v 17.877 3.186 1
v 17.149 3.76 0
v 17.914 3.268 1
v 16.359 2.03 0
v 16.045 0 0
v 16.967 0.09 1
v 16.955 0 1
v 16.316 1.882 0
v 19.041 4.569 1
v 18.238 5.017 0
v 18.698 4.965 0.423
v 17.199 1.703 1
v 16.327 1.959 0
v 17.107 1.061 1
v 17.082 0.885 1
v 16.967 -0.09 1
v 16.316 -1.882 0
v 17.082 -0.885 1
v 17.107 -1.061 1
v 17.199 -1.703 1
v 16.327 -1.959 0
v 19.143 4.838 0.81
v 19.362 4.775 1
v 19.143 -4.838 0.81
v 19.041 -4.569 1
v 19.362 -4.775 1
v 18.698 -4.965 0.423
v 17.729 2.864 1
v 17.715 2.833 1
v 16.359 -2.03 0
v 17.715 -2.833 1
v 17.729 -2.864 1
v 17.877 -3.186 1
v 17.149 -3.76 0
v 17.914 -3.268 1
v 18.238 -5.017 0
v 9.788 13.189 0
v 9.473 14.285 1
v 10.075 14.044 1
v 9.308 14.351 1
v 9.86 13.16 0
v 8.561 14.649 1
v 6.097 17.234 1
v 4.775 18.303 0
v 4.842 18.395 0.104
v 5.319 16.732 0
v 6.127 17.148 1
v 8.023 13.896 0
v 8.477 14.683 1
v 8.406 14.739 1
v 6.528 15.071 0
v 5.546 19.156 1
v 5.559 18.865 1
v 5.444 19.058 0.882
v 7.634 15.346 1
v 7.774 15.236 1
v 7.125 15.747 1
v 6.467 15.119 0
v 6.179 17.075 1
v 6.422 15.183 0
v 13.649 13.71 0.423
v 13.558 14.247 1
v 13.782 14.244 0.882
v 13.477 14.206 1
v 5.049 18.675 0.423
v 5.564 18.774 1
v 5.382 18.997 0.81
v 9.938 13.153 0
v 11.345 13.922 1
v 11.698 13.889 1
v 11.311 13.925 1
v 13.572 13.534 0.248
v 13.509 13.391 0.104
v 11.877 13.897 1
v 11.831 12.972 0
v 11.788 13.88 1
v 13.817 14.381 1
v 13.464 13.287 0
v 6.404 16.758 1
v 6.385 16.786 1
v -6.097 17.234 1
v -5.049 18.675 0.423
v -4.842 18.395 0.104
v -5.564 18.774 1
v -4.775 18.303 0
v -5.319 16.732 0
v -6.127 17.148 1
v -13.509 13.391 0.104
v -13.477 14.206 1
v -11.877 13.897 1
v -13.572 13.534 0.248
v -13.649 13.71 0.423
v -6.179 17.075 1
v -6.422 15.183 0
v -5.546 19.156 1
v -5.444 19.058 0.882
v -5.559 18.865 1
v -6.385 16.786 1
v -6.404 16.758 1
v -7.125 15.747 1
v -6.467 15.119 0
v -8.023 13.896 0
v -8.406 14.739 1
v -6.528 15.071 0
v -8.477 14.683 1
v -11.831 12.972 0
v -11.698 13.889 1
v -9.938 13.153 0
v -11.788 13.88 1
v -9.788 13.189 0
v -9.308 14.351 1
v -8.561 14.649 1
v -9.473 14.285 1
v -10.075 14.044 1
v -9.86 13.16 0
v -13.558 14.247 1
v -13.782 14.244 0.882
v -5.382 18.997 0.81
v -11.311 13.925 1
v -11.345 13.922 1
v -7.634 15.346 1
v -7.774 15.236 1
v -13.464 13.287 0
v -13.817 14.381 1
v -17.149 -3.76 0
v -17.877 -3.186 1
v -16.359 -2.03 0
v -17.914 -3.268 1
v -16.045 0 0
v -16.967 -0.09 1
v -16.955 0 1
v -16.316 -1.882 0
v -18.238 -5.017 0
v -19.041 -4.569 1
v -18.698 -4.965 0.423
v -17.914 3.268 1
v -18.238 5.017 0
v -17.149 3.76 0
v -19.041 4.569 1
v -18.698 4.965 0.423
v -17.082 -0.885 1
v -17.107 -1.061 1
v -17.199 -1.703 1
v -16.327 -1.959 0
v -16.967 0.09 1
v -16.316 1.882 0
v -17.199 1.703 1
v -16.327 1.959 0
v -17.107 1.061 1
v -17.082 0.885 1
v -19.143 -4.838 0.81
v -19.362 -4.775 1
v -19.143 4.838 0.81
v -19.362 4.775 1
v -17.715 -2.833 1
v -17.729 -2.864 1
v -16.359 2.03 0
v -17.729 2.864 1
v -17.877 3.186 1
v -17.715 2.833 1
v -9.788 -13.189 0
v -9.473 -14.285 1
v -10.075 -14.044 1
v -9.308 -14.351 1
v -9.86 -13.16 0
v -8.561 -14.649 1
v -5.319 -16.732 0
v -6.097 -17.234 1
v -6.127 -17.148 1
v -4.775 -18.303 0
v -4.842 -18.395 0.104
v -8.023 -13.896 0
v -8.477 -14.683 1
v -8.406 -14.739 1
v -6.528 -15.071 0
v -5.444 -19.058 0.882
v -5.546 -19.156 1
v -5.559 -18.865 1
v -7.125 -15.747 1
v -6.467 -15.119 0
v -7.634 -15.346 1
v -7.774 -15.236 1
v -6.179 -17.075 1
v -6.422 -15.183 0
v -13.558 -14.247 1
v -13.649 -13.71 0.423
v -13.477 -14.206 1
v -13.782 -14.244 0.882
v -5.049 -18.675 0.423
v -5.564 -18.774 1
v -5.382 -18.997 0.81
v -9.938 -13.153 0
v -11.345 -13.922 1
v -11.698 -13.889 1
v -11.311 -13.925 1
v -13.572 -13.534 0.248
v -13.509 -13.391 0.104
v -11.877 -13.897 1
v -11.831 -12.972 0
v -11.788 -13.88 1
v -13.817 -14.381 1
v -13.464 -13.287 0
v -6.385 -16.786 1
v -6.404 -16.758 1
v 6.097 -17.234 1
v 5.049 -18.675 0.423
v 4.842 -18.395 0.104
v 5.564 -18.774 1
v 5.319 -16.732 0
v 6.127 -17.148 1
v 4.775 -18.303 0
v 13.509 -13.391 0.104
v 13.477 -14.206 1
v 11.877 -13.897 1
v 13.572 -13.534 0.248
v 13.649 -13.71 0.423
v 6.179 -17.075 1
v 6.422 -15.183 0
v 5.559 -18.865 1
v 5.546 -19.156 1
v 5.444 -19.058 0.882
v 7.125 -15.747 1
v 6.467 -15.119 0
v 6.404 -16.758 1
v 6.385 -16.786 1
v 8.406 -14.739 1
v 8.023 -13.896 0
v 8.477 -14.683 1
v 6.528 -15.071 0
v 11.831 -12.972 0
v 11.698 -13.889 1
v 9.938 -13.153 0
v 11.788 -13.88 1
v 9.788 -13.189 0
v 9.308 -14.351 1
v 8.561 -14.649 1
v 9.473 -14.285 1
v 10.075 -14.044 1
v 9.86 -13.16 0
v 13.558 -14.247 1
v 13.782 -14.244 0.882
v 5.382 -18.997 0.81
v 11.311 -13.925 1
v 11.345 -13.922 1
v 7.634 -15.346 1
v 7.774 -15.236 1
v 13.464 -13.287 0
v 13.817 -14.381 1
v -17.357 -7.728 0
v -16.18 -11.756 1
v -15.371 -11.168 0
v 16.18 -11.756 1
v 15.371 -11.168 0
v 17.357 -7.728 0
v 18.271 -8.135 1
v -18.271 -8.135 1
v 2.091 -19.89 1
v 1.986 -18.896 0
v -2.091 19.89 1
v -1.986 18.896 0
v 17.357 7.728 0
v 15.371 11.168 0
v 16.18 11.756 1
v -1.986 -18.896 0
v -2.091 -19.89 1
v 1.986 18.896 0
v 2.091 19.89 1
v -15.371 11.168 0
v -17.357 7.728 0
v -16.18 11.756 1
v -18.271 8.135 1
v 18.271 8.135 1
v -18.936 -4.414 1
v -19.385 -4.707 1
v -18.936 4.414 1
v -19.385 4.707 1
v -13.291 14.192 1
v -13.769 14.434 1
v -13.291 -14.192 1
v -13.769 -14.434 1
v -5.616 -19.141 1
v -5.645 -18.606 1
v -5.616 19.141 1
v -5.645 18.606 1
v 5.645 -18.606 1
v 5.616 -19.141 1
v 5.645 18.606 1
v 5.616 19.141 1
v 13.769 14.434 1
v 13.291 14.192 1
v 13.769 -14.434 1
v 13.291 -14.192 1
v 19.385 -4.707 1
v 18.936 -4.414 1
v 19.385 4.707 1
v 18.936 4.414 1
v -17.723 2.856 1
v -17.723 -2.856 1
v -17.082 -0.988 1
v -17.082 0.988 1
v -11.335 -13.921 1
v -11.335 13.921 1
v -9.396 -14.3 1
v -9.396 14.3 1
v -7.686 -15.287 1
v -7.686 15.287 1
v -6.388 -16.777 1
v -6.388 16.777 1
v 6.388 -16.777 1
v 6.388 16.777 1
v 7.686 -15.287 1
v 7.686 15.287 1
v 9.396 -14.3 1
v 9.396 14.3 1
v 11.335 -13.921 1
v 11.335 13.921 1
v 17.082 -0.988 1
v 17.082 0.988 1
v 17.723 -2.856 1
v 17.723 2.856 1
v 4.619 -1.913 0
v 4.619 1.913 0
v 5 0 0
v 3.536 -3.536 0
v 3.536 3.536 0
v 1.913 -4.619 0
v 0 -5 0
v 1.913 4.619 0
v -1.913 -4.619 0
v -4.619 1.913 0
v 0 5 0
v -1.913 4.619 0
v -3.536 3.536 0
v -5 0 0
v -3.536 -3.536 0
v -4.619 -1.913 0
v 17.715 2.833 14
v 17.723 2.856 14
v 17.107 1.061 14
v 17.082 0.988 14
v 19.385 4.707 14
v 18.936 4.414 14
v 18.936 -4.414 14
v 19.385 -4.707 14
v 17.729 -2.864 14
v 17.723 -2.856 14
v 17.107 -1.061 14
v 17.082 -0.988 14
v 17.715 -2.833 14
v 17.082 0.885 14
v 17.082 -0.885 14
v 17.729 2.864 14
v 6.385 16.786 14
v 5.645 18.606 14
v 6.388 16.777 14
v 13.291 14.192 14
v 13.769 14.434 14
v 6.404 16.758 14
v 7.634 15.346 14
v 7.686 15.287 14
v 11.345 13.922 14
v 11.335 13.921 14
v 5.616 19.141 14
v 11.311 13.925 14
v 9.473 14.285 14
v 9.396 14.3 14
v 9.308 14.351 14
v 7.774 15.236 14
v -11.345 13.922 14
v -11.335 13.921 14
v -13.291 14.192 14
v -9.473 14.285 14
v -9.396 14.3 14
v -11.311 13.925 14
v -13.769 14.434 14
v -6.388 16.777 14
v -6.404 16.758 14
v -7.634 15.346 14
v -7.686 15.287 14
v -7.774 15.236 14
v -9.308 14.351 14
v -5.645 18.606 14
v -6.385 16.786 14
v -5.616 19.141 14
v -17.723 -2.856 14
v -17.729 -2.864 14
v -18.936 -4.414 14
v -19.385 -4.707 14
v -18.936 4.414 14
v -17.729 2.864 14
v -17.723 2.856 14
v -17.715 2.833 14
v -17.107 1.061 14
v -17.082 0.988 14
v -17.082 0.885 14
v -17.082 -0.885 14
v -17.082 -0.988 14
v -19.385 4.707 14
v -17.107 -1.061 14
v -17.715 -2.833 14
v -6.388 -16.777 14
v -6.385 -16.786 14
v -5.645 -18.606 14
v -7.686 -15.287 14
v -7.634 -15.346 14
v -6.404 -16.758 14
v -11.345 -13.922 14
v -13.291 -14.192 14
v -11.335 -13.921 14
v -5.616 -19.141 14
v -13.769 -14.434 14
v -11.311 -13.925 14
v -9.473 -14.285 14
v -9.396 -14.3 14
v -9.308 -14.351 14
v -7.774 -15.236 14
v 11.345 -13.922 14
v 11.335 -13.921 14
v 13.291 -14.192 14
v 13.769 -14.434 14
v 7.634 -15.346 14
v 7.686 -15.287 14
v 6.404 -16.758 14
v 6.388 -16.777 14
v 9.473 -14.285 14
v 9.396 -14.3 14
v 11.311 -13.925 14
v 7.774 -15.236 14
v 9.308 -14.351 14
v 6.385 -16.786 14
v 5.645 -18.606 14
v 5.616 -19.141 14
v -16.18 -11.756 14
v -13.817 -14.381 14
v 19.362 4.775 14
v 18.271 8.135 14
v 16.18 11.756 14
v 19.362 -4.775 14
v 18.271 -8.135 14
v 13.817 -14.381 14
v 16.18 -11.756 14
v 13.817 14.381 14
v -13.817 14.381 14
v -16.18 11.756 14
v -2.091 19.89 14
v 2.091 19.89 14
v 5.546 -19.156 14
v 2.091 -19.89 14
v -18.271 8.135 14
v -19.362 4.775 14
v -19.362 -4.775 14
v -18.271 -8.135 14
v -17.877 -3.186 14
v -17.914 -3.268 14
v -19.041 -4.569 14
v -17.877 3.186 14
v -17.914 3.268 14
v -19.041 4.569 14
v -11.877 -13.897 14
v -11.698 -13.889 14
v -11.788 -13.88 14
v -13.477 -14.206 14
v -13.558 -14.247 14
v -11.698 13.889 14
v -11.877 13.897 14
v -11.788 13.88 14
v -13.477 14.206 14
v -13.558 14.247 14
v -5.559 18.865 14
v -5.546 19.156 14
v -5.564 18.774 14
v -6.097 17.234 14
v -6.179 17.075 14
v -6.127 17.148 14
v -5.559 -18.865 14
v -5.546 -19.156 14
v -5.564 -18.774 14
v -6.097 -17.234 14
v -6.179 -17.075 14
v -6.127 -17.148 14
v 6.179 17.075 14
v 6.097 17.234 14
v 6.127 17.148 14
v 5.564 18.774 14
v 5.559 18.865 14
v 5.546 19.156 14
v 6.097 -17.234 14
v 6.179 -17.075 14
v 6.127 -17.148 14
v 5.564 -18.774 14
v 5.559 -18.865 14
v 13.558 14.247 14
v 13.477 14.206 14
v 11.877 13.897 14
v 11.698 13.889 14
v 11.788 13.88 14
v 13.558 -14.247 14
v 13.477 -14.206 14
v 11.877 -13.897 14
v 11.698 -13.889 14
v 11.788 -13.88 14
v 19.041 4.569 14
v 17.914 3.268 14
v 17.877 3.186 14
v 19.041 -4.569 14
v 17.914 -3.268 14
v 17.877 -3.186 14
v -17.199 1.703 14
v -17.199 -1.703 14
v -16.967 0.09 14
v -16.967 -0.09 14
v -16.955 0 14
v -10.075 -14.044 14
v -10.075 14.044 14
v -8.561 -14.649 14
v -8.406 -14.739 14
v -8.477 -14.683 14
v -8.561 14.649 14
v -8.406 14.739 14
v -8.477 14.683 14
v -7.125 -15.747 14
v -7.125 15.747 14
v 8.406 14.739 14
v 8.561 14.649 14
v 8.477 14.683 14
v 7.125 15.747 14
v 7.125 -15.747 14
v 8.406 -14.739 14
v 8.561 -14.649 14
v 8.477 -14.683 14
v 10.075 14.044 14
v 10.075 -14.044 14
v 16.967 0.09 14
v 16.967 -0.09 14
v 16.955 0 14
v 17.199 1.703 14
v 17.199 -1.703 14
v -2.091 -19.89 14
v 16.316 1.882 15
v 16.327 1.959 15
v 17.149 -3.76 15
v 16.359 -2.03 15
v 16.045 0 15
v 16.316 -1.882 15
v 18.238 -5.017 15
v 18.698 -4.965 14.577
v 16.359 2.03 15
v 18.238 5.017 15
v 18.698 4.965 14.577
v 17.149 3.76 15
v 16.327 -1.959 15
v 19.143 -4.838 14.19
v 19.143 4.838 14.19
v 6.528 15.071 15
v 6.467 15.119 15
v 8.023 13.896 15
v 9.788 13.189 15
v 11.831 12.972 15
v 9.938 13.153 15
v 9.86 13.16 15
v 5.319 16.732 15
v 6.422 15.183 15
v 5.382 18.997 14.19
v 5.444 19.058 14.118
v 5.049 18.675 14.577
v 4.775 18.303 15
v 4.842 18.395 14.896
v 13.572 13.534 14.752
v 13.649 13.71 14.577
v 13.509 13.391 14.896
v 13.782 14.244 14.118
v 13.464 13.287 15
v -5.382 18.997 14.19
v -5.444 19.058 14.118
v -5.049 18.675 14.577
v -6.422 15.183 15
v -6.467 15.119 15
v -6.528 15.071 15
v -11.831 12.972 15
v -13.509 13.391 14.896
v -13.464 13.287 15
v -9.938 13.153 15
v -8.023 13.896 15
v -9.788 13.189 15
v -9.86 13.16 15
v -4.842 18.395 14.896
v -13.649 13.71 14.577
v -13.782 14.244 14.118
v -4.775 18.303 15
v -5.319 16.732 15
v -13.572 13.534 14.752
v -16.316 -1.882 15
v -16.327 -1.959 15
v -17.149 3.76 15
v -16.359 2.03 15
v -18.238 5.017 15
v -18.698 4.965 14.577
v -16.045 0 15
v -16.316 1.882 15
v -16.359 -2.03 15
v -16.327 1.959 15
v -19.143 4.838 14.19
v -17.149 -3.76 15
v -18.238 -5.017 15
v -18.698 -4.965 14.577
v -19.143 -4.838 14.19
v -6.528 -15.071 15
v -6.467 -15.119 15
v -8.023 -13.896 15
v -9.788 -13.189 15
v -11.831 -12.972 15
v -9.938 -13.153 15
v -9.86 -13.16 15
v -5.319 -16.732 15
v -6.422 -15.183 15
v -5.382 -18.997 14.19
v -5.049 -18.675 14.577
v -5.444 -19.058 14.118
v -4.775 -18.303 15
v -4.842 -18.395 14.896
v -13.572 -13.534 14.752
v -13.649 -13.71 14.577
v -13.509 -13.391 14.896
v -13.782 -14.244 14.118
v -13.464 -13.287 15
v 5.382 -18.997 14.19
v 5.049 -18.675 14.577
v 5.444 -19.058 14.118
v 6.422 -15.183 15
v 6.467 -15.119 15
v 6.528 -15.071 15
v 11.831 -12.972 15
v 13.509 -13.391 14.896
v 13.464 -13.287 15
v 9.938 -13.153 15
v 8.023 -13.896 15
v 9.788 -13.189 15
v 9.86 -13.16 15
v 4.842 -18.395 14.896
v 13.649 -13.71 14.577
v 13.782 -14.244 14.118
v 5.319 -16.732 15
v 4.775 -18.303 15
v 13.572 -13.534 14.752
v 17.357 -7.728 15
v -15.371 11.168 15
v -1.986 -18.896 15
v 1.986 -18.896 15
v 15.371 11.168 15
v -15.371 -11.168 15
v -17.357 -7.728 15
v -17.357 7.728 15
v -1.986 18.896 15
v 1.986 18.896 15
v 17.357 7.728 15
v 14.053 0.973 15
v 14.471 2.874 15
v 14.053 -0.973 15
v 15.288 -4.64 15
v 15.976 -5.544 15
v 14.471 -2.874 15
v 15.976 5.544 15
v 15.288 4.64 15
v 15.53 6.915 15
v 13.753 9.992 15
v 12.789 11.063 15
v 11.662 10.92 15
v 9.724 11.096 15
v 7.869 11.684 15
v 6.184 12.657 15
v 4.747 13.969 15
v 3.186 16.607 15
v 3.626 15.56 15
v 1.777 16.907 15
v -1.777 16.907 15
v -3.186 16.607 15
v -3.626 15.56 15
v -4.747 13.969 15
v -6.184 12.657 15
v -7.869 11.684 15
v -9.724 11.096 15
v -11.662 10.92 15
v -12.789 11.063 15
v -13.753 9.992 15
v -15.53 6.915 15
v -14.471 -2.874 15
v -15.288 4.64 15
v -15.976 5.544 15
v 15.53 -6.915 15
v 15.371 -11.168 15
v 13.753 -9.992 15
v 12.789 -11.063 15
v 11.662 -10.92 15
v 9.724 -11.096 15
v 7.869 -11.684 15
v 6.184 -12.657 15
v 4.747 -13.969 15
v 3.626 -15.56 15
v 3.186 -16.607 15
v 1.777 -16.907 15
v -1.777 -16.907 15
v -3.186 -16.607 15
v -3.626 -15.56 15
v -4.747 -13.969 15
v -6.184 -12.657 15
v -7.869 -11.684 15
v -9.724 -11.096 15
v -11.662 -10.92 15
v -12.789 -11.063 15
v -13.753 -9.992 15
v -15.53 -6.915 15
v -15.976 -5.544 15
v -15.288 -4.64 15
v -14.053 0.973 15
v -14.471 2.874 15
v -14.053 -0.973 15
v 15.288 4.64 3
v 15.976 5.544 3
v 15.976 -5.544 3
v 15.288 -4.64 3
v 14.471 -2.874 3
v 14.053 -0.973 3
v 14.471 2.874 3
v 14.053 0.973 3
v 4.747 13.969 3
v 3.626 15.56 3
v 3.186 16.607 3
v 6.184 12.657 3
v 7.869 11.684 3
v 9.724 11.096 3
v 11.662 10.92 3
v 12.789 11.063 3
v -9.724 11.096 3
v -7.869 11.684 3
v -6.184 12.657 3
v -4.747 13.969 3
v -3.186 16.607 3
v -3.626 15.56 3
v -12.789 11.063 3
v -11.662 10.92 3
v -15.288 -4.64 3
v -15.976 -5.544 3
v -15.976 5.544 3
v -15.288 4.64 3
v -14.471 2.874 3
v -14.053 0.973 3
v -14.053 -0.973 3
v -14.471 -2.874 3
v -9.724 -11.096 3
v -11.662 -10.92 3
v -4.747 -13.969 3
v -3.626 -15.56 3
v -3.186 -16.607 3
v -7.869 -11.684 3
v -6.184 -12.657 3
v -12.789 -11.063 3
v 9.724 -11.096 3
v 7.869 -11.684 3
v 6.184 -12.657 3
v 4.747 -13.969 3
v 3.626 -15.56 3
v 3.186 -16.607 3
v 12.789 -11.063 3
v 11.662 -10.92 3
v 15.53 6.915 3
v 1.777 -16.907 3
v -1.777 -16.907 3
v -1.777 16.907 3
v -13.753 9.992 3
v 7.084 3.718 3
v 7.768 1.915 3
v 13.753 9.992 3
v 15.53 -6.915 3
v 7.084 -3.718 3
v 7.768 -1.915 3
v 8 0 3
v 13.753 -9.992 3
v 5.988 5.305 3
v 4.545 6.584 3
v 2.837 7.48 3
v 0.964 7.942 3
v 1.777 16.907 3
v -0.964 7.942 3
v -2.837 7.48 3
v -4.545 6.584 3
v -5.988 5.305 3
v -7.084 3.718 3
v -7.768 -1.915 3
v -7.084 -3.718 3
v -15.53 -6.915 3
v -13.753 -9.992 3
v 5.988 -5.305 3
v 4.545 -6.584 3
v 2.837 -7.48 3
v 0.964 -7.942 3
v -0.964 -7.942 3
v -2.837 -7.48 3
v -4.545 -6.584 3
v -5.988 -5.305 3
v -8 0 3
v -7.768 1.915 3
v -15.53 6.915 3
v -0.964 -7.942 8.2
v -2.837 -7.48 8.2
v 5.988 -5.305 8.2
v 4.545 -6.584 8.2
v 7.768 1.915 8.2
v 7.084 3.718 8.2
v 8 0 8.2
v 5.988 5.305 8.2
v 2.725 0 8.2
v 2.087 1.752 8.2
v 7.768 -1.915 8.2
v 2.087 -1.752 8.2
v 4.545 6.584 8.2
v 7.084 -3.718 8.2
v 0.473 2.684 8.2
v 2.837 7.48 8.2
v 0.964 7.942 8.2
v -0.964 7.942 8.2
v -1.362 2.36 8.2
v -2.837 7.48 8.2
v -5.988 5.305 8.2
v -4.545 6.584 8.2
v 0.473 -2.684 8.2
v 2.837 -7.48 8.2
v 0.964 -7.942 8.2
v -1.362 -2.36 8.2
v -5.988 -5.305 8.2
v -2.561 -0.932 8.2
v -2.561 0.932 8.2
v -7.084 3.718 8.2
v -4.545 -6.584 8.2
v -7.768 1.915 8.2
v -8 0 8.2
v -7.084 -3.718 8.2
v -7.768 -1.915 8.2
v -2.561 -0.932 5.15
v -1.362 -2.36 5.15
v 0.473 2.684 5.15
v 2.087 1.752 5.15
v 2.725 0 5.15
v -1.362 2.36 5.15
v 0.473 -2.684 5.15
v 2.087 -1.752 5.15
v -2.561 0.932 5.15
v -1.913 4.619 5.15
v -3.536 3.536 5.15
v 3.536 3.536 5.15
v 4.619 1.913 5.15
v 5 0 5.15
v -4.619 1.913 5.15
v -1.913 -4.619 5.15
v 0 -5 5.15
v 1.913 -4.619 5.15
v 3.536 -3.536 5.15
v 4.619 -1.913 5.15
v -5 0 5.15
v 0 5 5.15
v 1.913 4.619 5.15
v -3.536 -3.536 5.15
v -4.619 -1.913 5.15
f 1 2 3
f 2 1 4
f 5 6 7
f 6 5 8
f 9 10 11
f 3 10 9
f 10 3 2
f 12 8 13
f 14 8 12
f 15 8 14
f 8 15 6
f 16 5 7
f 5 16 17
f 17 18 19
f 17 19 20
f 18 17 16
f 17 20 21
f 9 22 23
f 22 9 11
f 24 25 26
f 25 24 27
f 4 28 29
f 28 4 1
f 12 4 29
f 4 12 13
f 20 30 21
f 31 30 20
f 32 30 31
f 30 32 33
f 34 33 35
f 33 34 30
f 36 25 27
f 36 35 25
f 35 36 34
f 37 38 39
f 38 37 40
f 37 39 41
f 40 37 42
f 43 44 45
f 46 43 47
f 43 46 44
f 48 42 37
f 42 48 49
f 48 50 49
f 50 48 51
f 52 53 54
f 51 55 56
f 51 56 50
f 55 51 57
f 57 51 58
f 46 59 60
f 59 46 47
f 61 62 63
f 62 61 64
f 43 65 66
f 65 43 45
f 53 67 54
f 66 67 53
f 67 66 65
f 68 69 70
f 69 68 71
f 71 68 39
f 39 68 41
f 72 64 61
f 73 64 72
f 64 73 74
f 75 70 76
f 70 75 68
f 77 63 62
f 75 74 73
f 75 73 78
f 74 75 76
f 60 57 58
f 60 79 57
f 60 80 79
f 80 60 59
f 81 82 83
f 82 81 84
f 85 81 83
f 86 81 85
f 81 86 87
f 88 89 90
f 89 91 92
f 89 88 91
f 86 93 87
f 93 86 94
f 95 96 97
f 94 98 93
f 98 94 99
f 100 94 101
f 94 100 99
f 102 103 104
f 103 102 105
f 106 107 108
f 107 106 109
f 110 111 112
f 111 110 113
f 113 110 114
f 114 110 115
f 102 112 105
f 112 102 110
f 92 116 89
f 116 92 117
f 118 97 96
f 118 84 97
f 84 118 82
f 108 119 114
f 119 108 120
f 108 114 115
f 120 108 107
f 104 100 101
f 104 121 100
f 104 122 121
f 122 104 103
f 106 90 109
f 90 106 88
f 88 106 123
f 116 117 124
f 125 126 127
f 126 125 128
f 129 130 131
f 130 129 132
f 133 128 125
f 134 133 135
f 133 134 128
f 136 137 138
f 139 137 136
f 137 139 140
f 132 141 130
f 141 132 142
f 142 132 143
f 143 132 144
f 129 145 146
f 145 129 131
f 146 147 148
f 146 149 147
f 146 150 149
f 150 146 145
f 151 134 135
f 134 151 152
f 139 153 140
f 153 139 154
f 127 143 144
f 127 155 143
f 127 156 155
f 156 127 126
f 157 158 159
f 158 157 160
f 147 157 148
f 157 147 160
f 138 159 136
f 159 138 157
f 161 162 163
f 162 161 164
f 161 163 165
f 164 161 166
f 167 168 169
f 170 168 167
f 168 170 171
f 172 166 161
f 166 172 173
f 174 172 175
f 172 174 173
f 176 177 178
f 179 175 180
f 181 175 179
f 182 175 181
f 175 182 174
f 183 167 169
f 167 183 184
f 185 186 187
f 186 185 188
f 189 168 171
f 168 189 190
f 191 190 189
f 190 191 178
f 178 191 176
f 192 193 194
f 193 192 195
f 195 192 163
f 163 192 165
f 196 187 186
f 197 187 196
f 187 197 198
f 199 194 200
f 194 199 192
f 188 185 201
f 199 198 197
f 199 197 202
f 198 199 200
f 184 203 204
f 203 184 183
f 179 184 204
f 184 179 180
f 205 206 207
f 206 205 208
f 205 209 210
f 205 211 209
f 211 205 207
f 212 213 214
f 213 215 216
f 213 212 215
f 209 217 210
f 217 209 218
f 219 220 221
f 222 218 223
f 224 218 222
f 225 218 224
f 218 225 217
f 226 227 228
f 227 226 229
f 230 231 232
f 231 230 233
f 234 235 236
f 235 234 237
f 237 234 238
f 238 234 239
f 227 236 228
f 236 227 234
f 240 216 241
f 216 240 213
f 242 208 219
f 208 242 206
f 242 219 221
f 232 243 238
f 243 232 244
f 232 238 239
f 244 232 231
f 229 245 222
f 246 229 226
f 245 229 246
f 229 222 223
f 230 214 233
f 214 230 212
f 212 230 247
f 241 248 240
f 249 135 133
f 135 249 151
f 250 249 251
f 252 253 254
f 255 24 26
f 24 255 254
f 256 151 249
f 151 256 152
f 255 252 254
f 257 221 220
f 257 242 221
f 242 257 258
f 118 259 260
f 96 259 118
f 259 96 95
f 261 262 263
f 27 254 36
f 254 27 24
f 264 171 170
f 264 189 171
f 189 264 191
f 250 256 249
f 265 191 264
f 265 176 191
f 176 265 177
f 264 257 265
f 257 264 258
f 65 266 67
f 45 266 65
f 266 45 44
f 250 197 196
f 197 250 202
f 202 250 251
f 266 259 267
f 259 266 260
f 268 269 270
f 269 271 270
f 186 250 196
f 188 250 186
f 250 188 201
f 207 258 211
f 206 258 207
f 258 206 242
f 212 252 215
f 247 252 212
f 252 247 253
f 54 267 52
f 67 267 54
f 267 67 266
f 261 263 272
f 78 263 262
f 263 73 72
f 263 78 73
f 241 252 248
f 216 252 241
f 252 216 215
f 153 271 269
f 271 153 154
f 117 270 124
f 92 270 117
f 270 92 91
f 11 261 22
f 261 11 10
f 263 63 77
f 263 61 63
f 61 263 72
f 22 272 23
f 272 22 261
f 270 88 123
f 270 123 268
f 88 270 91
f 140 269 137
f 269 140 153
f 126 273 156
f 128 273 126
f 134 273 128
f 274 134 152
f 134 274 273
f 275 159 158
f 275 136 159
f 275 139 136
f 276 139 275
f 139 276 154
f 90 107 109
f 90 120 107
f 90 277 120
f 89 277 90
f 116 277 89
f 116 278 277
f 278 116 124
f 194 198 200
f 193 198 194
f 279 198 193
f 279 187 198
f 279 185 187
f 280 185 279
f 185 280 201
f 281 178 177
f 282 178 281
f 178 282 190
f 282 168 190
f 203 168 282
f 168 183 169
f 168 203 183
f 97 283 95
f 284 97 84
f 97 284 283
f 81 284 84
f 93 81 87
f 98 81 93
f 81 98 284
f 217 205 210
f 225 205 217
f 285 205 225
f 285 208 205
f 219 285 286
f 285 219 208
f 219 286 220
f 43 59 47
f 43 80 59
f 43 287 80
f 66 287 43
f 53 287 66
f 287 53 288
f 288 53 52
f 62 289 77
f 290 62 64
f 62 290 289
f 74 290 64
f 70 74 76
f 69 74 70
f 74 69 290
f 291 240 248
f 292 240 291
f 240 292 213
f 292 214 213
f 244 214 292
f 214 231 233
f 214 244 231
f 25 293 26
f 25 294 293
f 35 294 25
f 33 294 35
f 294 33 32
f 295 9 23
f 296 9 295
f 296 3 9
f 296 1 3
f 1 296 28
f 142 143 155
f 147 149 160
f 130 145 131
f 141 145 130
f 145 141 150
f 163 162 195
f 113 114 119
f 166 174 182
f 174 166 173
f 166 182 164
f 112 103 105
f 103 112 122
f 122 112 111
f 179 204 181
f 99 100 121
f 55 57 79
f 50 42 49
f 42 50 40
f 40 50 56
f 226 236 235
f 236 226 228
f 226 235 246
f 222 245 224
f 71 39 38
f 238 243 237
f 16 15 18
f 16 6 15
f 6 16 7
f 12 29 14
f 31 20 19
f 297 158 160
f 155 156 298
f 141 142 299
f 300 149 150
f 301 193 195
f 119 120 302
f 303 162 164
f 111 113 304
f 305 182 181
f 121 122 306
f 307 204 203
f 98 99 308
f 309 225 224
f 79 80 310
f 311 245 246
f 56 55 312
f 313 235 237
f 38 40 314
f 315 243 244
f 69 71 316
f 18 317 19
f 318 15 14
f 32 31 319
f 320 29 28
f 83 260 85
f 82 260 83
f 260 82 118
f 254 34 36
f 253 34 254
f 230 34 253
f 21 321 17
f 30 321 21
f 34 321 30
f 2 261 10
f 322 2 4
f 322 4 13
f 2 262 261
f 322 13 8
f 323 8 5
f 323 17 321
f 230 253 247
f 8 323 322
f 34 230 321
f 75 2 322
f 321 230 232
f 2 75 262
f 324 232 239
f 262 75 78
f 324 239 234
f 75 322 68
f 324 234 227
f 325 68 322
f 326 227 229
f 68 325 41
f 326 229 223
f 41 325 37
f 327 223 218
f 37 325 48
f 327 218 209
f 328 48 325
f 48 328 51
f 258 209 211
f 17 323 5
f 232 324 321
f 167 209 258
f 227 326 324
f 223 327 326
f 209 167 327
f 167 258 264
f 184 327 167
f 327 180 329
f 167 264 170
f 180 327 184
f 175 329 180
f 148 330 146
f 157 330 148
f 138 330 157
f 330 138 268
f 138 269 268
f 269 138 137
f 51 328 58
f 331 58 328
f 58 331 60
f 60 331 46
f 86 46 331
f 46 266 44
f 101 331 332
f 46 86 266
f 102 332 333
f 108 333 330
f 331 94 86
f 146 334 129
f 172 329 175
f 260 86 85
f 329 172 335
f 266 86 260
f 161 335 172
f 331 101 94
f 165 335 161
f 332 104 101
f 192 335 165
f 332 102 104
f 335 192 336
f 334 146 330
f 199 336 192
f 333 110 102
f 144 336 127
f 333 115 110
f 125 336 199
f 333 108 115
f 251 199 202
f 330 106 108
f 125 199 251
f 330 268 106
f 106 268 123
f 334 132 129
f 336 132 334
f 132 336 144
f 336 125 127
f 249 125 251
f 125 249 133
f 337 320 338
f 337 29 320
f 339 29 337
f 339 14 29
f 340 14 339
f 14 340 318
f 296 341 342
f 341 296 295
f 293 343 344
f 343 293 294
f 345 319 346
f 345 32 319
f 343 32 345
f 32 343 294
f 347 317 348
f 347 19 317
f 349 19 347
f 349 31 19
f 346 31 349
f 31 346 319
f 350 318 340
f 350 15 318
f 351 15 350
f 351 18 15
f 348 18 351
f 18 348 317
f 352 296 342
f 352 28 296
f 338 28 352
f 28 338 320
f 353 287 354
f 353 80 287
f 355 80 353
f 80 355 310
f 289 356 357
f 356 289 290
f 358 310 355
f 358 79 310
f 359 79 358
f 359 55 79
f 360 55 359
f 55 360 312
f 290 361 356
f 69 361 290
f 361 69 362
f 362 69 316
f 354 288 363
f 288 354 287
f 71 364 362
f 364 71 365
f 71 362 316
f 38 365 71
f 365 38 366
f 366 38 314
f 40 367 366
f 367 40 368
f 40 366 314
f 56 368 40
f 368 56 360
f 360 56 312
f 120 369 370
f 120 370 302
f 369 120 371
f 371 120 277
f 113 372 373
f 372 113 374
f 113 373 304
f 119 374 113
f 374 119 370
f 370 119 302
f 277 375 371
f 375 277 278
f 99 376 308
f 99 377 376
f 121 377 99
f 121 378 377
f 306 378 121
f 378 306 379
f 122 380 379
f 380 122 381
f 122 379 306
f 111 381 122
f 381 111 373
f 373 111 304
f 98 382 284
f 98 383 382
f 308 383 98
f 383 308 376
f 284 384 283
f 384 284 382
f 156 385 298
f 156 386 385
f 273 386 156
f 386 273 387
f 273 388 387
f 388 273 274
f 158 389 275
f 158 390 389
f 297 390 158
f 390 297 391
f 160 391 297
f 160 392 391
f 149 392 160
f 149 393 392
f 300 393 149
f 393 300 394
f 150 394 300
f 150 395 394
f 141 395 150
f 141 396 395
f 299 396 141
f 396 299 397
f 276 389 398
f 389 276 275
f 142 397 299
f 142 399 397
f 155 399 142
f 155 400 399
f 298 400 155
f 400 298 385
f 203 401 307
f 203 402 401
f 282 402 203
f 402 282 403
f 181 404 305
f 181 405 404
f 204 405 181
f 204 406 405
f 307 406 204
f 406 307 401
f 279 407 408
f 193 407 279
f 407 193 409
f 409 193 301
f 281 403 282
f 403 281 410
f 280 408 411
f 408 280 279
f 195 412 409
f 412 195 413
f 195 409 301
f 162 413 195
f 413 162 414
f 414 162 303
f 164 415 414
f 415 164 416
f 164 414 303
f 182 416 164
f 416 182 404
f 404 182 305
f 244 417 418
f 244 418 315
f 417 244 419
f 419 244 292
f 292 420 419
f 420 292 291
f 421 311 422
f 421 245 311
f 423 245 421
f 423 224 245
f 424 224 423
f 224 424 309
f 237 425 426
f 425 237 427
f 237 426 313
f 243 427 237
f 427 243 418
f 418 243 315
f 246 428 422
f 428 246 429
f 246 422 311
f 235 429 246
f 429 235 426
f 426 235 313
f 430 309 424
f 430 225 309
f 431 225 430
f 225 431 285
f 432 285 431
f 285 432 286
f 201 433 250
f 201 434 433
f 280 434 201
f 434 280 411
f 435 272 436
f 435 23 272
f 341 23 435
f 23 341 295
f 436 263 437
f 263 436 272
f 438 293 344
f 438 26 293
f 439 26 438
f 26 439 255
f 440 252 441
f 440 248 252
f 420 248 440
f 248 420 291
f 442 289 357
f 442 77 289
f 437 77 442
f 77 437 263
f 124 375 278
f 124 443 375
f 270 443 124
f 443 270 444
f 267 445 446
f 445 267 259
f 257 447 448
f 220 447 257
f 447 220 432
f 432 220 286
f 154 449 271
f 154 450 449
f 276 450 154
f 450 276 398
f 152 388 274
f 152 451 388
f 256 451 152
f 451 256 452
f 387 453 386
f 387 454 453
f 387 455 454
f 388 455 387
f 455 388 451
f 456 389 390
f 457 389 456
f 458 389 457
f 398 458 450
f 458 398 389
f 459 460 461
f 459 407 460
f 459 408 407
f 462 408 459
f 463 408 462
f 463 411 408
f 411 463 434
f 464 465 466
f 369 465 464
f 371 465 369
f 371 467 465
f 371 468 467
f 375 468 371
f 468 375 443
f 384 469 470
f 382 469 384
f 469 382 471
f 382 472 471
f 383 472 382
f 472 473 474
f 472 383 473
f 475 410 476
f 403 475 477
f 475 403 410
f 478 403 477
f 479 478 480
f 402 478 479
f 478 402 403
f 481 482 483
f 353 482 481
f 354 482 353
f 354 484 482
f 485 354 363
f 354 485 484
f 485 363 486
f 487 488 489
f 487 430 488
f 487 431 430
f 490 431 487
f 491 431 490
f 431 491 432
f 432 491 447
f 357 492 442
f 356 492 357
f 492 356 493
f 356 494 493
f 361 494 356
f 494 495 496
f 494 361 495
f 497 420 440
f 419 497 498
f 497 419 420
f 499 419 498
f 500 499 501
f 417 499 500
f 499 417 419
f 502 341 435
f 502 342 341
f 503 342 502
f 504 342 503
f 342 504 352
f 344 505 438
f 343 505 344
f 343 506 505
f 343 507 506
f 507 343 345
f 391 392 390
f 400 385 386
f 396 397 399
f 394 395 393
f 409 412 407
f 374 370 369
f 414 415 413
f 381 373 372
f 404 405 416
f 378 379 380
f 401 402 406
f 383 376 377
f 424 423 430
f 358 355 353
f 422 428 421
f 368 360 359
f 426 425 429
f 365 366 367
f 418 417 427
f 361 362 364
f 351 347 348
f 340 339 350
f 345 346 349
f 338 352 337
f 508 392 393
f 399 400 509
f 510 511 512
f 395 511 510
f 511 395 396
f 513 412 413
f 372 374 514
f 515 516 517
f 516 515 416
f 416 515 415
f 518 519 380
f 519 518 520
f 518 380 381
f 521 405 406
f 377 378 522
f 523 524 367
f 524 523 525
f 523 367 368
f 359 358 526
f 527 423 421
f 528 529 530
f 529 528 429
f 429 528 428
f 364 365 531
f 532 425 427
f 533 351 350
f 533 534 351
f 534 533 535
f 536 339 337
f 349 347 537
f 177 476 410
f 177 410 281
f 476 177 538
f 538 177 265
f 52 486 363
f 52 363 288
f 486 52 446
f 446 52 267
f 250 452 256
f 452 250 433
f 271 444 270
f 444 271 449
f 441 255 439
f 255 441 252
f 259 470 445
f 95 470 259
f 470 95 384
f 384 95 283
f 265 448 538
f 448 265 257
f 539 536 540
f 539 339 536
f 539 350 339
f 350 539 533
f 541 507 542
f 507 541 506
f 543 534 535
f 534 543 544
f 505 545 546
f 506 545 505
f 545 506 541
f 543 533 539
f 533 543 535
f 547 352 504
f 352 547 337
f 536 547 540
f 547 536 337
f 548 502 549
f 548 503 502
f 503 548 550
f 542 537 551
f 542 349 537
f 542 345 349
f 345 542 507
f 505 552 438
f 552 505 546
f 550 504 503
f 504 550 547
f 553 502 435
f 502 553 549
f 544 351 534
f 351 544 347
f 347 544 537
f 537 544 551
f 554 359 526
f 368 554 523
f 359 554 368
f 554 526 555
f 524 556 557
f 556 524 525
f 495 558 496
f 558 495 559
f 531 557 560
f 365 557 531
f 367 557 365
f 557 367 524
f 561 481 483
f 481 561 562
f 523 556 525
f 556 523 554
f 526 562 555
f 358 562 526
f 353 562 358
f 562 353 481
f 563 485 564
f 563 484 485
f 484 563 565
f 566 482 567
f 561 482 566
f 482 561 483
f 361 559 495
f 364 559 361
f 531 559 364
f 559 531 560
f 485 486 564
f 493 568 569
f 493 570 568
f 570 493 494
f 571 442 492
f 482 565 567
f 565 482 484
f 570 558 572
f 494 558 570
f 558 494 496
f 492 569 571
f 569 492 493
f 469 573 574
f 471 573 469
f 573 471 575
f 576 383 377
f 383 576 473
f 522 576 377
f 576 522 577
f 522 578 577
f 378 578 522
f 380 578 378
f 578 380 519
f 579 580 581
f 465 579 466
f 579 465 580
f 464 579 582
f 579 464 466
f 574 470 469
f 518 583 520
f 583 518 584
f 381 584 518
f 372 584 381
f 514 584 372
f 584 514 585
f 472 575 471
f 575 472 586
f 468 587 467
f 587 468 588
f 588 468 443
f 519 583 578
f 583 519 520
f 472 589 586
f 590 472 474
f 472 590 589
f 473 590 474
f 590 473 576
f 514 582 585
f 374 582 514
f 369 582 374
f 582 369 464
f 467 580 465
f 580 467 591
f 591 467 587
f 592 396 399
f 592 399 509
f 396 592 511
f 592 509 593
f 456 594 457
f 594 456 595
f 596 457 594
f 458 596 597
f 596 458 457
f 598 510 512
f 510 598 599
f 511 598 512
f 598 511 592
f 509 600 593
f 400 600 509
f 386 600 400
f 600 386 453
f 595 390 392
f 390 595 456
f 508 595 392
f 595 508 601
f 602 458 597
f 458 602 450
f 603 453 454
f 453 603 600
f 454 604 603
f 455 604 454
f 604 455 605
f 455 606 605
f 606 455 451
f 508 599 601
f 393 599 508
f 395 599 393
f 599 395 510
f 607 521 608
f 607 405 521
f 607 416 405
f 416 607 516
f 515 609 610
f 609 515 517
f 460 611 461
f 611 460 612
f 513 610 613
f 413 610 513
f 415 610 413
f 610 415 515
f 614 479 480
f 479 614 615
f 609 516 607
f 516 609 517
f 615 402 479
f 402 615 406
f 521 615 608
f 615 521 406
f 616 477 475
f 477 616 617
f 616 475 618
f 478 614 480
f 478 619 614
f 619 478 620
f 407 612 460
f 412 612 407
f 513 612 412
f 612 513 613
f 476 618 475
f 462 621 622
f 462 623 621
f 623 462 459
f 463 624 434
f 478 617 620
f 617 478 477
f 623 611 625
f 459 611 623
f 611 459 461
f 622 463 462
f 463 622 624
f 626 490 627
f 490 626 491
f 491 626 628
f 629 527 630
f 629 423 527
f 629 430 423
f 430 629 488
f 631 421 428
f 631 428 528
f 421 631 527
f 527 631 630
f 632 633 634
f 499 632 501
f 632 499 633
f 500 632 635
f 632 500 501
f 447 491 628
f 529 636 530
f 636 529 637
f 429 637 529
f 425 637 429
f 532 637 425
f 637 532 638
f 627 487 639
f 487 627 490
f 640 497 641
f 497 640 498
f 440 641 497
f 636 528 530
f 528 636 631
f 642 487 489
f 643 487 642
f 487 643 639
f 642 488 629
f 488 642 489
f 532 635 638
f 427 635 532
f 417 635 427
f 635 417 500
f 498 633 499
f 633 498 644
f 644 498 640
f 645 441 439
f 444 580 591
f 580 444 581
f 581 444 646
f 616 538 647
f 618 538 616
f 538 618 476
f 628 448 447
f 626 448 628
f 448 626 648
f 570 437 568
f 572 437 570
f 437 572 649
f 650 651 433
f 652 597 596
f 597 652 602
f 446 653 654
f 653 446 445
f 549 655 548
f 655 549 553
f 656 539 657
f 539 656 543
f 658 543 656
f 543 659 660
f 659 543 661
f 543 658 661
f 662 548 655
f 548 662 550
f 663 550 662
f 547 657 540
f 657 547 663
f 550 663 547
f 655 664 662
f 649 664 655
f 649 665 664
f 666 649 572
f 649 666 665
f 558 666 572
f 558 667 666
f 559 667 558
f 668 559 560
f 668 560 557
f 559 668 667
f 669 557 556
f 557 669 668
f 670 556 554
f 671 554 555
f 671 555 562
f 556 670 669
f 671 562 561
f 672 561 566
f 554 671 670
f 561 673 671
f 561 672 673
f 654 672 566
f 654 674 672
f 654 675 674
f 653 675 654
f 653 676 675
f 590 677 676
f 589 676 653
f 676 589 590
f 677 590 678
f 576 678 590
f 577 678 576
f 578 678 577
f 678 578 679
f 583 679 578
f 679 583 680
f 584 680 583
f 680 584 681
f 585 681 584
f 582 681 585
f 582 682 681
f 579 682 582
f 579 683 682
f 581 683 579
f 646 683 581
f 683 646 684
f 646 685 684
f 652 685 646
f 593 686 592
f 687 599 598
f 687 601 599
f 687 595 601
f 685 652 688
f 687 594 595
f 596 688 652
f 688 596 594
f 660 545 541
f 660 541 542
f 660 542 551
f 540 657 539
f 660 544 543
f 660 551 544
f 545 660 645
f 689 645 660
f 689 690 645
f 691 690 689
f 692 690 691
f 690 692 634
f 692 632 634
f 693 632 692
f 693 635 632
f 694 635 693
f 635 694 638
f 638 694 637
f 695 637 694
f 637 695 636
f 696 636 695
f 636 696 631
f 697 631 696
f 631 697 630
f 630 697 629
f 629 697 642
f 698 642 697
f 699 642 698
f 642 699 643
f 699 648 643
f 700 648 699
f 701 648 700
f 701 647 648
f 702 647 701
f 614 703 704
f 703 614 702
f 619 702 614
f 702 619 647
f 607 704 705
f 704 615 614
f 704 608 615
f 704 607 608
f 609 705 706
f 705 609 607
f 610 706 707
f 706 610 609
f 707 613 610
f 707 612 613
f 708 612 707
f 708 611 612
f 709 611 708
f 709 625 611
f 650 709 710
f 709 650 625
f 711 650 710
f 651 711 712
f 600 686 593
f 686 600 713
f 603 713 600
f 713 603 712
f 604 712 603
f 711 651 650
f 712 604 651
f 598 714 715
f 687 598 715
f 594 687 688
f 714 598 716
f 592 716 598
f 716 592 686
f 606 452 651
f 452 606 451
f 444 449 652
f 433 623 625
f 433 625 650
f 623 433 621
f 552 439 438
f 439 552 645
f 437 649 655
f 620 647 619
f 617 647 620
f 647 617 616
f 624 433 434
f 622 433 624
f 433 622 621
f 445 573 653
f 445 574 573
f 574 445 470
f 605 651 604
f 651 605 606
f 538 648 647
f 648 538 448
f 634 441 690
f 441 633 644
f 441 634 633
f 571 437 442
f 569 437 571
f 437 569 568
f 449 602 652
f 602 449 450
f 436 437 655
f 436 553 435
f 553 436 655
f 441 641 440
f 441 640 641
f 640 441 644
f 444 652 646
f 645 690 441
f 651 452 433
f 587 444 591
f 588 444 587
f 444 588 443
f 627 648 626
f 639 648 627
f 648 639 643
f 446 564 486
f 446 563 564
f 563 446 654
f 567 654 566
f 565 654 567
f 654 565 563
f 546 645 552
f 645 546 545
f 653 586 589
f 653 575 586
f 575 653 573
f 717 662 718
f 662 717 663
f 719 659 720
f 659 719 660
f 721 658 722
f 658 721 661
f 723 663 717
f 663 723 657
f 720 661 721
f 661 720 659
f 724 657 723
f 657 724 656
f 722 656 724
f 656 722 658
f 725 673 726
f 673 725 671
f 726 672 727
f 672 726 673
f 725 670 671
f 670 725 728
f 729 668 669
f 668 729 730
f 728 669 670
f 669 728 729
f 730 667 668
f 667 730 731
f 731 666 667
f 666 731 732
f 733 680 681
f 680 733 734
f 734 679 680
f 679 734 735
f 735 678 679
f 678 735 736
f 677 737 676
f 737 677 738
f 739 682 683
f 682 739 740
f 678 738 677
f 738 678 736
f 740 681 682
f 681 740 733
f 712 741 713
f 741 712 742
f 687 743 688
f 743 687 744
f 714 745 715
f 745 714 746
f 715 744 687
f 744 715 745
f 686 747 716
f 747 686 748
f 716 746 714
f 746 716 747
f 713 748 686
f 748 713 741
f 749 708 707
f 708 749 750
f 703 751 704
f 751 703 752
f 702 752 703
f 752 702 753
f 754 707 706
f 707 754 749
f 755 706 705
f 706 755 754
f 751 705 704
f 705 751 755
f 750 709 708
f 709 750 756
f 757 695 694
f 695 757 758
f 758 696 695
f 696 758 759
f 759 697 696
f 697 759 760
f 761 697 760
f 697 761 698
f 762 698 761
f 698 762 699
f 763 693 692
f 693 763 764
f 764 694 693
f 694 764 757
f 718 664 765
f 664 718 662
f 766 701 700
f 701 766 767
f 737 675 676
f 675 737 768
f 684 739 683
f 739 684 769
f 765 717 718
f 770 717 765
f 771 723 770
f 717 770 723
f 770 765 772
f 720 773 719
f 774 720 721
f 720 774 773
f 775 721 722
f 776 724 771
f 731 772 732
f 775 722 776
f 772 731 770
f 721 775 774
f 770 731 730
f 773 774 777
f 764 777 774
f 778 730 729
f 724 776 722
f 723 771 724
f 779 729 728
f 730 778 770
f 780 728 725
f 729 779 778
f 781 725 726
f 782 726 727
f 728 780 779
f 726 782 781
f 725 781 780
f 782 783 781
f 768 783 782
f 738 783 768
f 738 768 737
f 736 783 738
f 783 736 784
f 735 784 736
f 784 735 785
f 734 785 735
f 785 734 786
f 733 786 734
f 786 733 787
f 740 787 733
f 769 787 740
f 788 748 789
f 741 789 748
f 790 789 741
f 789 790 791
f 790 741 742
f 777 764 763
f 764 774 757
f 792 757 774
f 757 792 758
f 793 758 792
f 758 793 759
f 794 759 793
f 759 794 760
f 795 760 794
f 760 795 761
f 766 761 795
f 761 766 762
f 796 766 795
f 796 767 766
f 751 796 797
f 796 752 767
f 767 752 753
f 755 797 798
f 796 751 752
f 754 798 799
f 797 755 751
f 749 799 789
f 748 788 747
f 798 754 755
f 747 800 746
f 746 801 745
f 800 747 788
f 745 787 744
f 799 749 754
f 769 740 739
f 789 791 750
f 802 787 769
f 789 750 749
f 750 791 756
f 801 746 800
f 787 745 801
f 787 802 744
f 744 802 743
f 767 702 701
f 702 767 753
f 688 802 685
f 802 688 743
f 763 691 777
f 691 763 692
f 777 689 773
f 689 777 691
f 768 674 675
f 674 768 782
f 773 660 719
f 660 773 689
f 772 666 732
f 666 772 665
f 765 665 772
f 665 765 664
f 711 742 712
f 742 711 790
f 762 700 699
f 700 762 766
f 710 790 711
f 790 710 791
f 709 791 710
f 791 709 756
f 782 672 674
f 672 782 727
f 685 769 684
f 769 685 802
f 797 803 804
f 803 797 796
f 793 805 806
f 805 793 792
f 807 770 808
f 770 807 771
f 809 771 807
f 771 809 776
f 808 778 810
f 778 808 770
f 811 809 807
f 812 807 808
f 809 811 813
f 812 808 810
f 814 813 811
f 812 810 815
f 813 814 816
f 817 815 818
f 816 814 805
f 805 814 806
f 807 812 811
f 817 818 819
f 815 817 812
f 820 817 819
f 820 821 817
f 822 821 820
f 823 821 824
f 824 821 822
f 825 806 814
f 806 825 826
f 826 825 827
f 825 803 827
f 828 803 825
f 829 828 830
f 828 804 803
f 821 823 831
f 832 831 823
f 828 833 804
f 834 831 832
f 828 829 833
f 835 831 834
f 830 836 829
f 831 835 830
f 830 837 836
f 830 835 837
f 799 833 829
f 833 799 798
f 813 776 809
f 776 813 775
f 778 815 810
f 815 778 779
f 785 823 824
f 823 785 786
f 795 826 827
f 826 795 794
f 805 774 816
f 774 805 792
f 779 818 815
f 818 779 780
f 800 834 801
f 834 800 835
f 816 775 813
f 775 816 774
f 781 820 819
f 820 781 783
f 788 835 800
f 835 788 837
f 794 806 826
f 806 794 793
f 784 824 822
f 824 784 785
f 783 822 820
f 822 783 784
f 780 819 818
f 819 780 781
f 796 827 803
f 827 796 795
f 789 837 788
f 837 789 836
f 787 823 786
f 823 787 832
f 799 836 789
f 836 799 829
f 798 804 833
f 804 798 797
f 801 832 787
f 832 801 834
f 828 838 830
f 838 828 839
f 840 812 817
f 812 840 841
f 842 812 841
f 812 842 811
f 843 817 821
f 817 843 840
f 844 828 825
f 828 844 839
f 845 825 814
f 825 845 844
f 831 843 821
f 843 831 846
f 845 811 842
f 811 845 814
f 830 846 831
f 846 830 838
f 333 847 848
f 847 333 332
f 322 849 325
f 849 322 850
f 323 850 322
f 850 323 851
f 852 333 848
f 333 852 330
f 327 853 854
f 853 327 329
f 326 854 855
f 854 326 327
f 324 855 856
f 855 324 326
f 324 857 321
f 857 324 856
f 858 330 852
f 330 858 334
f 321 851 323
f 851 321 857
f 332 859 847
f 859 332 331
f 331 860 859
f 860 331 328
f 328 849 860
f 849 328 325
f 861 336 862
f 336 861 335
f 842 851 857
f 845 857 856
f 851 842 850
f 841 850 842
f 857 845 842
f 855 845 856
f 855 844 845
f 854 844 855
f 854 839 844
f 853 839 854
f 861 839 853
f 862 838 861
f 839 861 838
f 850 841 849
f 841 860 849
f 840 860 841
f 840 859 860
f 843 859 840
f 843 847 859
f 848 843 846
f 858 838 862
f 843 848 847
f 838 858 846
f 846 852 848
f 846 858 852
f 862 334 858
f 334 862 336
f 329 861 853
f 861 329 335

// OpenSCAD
/*
Universal Thumbnut/Socket Knob Design
By: Harrison Fast (2013)

This is a parametric script for a thumb knob which can be used on either a nut, hex head cap screw, or socket head cap screw.
Options include:
unit of measure (metric, imperial)
thread size []
pocket type (Constant_Wall_Thickness, Solid, Circular)
knob diameter
number of rosettes (fingers/cutouts)
size and position of rosette
wall thickness
top wall thickness

Should work in the Thingiverse Customizer

*/

//****Variables - To be Set****\\
//CUSTOMIZER VARIABLES

//What's This Knob For?
Knob_Type=3;//[1:Nut,2:Hex Head Screw,3:Socket Head Screw]

//What Size Nut or Screw? 
Thread_Size=6; //[0:M1.6,1:M2,2:M2.5,3:M3,4:M4,5:M5,6:M6,7:M8,8:M10,9:M12,10:M14,11:M16,12:M20]

//What Kind of Pocket Do You Want?
Knob_Fill=1;//[1:Constant Wall Thickness,2:Solid,3:Circular Cut-Out]

//How Big Should The Knob Be?
Knob_Diameter = 40;
knob_r = Knob_Diameter/2;

//How Thick Should the Grip Be? (Overall Height)
Knob_Thickness=15;
knob_t=Knob_Thickness*1;

//How Thick Should The Walls Be?
Wall_Thickness=3;

//How Many Prongs Should It Have?
Number_of_Rosettes=6; //[1:16]

//How Big Should The Finger Dents Be?
Rosette_Radius=6; 

//How Far Should The Finger Dents be From The Knob Circumference? (This lets you use larger radii by moving the center of the cut-out cylinder away from the center of the knob)
Rosette_Offset = 3;

//How Big Should the Bevel Be?
Chamfer_Size=1;
r_cham = Chamfer_Size*1; //Too lazy to change the proper names to Chamfer_Size

//How Much Clearance Do You Want? 0 probably won't work.
Clearance=.25; //[0:.125:1];

//CUSTOMIZER VARIABLES END


//$fa=6;


echo(knob_t);
knob_hex(); //main function call


//****MODULES***\\

module hex_trude(hex_width,hex_height) //makes a hexagonal prism at hex_width
	{	
		s = hex_width/1.732;
		l_x=s/2;
		l_y=.866*s;
		a_1 = [ [s,0],[l_x,-l_y],[-l_x,-l_y],[-s,0],[-l_x,l_y],[l_x,l_y]];
		b=[0:5];
		linear_extrude (height = hex_height) polygon(a_1,b);
	}


module pocket(hex_width,hex_height)
{	
	if(Knob_Fill==1){
		difference() {
			 translate([0,0,Wall_Thickness]) {cylinder(h=hex_height, r=knob_r-Wall_Thickness);} //wall offset
				for(i=[0:Number_of_Rosettes-1]) {
					rotate([0,0,360*i/Number_of_Rosettes]) 
						translate([knob_r+Rosette_Offset,0,0]) {
							cylinder(h = Wall_Thickness+hex_height, r = Rosette_Radius+Wall_Thickness); } //wall offset rosette
								}
	}//endif
					}

	else if(Knob_Fill==2){
	}//endif

	else if(Knob_Fill==3) {
		translate([0,0,Wall_Thickness]) {
			cylinder(h=hex_height,r=knob_r-Wall_Thickness-Rosette_Radius+Rosette_Offset);
						}
	}//endif
			
} //end module pocket()



module knobby_base_parts(knob_r, knob_h, rA, rB)
{
	difference()
	{
		cylinder(h=knob_h,r1=knob_r-rA,r2=knob_r-rB);
		for(i=[0:Number_of_Rosettes]){
			rotate(360*i/Number_of_Rosettes,[0,0,1]) translate([knob_r+Rosette_Offset,0,-0.05])
				cylinder(h=knob_h+.1,r1=Rosette_Radius+rA,r2=Rosette_Radius+rB);
		} //end if
	} //end difference
} //end knobby_base_parts



module knobby_base(hex_width,hex_height,r_cham)
{
	difference(){
			union() {
				knobby_base_parts(knob_r,r_cham,r_cham,0);
				if(hex_height<Wall_Thickness){
					union() {
						translate([0,0,r_cham]) knobby_base_parts(knob_r,Wall_Thickness-2*r_cham,0,0); 
						translate([0,0,Wall_Thickness]) knobby_base_parts(knob_r, r_cham,0,r_cham);}}

				else {translate([0,0,r_cham]) knobby_base_parts(knob_r,hex_height-2*r_cham,0,0);
					union() {
						translate([0,0,r_cham]) knobby_base_parts(knob_r,hex_height-2*r_cham,0,0); 
						translate([0,0,hex_height-r_cham]) knobby_base_parts(knob_r, r_cham,0,r_cham); }}
				} //end union
			pocket(hex_width,hex_height+1);
					} //end difference
} //end knobby_base


module make_knob(hex_width,hex_height,r_cham)
{
	if(Knob_Type==1){
	difference(){
			union(){
			rotate(0,[0,0,1]) {
			difference(){
				knobby_base(hex_width,knob_t,r_cham);
				translate([0,0,Wall_Thickness])hex_trude(hex_width+.25,hex_height+1+knob_t);
				}}
			translate([0,0,Wall_Thickness]) {
				difference() {
					hex_trude(hex_width+Wall_Thickness*2,hex_height);
					hex_trude(hex_width+.25,hex_height+.1);}
					}}
		translate([0,0,-.1]) cylinder(h=Wall_Thickness+hex_height+.2, r = Thread_Size/2+.25);
	 } 	//end Difference
	} //end if

	else if(Knob_Type==2) {
	difference() {
		union() {
			knobby_base(hex_width,knob_t,r_cham);
			cylinder(h=hex_height+Wall_Thickness, r=hex_width/2+Wall_Thickness);
			} //end union
		translate([0,0,-.05]) hex_trude(hex_width+.25,hex_height);
		translate([0,0,-.5]) cylinder(h=hex_height+Wall_Thickness+1+knob_t, r=thread_d[Thread_Size]/2+.125);
		}//end difference
	}//end if
			

	else if(Knob_Type==3) {
	difference(){
		union() {
			knobby_base(hex_width,knob_t,r_cham);
			cylinder(h=hex_height+Wall_Thickness, r=hex_width/2+Wall_Thickness);
		}//end union
			translate([0,0,-.05]) cylinder(h=hex_height+Knob_Thickness, r=hex_height/2+.125);
			translate([0,0,-.05]) cylinder(h=hex_height, r=hex_width/2);
	} //end difference
		} //end if
} //end module make_knob_hex


module knob_hex(){
	if (Knob_Type==1 || 2){
		make_knob(hex_w_table[Thread_Size],hex_h_table[Thread_Size],r_cham);
		}//end if
	else if (Knob_Type==3){
		make_knob(shcs_d_table[Thread_Size],thread_d[Thread_Size],r_cham);
} //end_if
} //end knob_hex

//****END KNOB BUILDING****\\

//****LOOKUP TABLES****\\

//----Lookup----\\

//----Thread Outer Diameter----\\\\
thread_d=[1.6,2,2.5,3,4,5,6,8,10,12,14,16,20,24];

//----Hex Width----\\
hex_w_table=[3.2,4,5,5.5,7,8,10,13,16,18,21,24,30,36];

//----Hex Height----\\
hex_h_table=[1.3,1.6,2,2.4,3.2,4.7,5.2,6.8,8.4,10.8,12.8,14.8,18,21.5];

//----Hex Head Height----\\
hex_head_height=[1.3,2,2.1,2.1,2.9,3.5,4.1,5.4,6.5,7.6,8.8,10,12.5,15];

//----SHCS Diameter----\\
shcs_d_table=[2.5,3.8,4.2,5.5,7,8.5,10,13,16,18,21,24,27,30];
//----SHCS Height = Thread Size!---\\
